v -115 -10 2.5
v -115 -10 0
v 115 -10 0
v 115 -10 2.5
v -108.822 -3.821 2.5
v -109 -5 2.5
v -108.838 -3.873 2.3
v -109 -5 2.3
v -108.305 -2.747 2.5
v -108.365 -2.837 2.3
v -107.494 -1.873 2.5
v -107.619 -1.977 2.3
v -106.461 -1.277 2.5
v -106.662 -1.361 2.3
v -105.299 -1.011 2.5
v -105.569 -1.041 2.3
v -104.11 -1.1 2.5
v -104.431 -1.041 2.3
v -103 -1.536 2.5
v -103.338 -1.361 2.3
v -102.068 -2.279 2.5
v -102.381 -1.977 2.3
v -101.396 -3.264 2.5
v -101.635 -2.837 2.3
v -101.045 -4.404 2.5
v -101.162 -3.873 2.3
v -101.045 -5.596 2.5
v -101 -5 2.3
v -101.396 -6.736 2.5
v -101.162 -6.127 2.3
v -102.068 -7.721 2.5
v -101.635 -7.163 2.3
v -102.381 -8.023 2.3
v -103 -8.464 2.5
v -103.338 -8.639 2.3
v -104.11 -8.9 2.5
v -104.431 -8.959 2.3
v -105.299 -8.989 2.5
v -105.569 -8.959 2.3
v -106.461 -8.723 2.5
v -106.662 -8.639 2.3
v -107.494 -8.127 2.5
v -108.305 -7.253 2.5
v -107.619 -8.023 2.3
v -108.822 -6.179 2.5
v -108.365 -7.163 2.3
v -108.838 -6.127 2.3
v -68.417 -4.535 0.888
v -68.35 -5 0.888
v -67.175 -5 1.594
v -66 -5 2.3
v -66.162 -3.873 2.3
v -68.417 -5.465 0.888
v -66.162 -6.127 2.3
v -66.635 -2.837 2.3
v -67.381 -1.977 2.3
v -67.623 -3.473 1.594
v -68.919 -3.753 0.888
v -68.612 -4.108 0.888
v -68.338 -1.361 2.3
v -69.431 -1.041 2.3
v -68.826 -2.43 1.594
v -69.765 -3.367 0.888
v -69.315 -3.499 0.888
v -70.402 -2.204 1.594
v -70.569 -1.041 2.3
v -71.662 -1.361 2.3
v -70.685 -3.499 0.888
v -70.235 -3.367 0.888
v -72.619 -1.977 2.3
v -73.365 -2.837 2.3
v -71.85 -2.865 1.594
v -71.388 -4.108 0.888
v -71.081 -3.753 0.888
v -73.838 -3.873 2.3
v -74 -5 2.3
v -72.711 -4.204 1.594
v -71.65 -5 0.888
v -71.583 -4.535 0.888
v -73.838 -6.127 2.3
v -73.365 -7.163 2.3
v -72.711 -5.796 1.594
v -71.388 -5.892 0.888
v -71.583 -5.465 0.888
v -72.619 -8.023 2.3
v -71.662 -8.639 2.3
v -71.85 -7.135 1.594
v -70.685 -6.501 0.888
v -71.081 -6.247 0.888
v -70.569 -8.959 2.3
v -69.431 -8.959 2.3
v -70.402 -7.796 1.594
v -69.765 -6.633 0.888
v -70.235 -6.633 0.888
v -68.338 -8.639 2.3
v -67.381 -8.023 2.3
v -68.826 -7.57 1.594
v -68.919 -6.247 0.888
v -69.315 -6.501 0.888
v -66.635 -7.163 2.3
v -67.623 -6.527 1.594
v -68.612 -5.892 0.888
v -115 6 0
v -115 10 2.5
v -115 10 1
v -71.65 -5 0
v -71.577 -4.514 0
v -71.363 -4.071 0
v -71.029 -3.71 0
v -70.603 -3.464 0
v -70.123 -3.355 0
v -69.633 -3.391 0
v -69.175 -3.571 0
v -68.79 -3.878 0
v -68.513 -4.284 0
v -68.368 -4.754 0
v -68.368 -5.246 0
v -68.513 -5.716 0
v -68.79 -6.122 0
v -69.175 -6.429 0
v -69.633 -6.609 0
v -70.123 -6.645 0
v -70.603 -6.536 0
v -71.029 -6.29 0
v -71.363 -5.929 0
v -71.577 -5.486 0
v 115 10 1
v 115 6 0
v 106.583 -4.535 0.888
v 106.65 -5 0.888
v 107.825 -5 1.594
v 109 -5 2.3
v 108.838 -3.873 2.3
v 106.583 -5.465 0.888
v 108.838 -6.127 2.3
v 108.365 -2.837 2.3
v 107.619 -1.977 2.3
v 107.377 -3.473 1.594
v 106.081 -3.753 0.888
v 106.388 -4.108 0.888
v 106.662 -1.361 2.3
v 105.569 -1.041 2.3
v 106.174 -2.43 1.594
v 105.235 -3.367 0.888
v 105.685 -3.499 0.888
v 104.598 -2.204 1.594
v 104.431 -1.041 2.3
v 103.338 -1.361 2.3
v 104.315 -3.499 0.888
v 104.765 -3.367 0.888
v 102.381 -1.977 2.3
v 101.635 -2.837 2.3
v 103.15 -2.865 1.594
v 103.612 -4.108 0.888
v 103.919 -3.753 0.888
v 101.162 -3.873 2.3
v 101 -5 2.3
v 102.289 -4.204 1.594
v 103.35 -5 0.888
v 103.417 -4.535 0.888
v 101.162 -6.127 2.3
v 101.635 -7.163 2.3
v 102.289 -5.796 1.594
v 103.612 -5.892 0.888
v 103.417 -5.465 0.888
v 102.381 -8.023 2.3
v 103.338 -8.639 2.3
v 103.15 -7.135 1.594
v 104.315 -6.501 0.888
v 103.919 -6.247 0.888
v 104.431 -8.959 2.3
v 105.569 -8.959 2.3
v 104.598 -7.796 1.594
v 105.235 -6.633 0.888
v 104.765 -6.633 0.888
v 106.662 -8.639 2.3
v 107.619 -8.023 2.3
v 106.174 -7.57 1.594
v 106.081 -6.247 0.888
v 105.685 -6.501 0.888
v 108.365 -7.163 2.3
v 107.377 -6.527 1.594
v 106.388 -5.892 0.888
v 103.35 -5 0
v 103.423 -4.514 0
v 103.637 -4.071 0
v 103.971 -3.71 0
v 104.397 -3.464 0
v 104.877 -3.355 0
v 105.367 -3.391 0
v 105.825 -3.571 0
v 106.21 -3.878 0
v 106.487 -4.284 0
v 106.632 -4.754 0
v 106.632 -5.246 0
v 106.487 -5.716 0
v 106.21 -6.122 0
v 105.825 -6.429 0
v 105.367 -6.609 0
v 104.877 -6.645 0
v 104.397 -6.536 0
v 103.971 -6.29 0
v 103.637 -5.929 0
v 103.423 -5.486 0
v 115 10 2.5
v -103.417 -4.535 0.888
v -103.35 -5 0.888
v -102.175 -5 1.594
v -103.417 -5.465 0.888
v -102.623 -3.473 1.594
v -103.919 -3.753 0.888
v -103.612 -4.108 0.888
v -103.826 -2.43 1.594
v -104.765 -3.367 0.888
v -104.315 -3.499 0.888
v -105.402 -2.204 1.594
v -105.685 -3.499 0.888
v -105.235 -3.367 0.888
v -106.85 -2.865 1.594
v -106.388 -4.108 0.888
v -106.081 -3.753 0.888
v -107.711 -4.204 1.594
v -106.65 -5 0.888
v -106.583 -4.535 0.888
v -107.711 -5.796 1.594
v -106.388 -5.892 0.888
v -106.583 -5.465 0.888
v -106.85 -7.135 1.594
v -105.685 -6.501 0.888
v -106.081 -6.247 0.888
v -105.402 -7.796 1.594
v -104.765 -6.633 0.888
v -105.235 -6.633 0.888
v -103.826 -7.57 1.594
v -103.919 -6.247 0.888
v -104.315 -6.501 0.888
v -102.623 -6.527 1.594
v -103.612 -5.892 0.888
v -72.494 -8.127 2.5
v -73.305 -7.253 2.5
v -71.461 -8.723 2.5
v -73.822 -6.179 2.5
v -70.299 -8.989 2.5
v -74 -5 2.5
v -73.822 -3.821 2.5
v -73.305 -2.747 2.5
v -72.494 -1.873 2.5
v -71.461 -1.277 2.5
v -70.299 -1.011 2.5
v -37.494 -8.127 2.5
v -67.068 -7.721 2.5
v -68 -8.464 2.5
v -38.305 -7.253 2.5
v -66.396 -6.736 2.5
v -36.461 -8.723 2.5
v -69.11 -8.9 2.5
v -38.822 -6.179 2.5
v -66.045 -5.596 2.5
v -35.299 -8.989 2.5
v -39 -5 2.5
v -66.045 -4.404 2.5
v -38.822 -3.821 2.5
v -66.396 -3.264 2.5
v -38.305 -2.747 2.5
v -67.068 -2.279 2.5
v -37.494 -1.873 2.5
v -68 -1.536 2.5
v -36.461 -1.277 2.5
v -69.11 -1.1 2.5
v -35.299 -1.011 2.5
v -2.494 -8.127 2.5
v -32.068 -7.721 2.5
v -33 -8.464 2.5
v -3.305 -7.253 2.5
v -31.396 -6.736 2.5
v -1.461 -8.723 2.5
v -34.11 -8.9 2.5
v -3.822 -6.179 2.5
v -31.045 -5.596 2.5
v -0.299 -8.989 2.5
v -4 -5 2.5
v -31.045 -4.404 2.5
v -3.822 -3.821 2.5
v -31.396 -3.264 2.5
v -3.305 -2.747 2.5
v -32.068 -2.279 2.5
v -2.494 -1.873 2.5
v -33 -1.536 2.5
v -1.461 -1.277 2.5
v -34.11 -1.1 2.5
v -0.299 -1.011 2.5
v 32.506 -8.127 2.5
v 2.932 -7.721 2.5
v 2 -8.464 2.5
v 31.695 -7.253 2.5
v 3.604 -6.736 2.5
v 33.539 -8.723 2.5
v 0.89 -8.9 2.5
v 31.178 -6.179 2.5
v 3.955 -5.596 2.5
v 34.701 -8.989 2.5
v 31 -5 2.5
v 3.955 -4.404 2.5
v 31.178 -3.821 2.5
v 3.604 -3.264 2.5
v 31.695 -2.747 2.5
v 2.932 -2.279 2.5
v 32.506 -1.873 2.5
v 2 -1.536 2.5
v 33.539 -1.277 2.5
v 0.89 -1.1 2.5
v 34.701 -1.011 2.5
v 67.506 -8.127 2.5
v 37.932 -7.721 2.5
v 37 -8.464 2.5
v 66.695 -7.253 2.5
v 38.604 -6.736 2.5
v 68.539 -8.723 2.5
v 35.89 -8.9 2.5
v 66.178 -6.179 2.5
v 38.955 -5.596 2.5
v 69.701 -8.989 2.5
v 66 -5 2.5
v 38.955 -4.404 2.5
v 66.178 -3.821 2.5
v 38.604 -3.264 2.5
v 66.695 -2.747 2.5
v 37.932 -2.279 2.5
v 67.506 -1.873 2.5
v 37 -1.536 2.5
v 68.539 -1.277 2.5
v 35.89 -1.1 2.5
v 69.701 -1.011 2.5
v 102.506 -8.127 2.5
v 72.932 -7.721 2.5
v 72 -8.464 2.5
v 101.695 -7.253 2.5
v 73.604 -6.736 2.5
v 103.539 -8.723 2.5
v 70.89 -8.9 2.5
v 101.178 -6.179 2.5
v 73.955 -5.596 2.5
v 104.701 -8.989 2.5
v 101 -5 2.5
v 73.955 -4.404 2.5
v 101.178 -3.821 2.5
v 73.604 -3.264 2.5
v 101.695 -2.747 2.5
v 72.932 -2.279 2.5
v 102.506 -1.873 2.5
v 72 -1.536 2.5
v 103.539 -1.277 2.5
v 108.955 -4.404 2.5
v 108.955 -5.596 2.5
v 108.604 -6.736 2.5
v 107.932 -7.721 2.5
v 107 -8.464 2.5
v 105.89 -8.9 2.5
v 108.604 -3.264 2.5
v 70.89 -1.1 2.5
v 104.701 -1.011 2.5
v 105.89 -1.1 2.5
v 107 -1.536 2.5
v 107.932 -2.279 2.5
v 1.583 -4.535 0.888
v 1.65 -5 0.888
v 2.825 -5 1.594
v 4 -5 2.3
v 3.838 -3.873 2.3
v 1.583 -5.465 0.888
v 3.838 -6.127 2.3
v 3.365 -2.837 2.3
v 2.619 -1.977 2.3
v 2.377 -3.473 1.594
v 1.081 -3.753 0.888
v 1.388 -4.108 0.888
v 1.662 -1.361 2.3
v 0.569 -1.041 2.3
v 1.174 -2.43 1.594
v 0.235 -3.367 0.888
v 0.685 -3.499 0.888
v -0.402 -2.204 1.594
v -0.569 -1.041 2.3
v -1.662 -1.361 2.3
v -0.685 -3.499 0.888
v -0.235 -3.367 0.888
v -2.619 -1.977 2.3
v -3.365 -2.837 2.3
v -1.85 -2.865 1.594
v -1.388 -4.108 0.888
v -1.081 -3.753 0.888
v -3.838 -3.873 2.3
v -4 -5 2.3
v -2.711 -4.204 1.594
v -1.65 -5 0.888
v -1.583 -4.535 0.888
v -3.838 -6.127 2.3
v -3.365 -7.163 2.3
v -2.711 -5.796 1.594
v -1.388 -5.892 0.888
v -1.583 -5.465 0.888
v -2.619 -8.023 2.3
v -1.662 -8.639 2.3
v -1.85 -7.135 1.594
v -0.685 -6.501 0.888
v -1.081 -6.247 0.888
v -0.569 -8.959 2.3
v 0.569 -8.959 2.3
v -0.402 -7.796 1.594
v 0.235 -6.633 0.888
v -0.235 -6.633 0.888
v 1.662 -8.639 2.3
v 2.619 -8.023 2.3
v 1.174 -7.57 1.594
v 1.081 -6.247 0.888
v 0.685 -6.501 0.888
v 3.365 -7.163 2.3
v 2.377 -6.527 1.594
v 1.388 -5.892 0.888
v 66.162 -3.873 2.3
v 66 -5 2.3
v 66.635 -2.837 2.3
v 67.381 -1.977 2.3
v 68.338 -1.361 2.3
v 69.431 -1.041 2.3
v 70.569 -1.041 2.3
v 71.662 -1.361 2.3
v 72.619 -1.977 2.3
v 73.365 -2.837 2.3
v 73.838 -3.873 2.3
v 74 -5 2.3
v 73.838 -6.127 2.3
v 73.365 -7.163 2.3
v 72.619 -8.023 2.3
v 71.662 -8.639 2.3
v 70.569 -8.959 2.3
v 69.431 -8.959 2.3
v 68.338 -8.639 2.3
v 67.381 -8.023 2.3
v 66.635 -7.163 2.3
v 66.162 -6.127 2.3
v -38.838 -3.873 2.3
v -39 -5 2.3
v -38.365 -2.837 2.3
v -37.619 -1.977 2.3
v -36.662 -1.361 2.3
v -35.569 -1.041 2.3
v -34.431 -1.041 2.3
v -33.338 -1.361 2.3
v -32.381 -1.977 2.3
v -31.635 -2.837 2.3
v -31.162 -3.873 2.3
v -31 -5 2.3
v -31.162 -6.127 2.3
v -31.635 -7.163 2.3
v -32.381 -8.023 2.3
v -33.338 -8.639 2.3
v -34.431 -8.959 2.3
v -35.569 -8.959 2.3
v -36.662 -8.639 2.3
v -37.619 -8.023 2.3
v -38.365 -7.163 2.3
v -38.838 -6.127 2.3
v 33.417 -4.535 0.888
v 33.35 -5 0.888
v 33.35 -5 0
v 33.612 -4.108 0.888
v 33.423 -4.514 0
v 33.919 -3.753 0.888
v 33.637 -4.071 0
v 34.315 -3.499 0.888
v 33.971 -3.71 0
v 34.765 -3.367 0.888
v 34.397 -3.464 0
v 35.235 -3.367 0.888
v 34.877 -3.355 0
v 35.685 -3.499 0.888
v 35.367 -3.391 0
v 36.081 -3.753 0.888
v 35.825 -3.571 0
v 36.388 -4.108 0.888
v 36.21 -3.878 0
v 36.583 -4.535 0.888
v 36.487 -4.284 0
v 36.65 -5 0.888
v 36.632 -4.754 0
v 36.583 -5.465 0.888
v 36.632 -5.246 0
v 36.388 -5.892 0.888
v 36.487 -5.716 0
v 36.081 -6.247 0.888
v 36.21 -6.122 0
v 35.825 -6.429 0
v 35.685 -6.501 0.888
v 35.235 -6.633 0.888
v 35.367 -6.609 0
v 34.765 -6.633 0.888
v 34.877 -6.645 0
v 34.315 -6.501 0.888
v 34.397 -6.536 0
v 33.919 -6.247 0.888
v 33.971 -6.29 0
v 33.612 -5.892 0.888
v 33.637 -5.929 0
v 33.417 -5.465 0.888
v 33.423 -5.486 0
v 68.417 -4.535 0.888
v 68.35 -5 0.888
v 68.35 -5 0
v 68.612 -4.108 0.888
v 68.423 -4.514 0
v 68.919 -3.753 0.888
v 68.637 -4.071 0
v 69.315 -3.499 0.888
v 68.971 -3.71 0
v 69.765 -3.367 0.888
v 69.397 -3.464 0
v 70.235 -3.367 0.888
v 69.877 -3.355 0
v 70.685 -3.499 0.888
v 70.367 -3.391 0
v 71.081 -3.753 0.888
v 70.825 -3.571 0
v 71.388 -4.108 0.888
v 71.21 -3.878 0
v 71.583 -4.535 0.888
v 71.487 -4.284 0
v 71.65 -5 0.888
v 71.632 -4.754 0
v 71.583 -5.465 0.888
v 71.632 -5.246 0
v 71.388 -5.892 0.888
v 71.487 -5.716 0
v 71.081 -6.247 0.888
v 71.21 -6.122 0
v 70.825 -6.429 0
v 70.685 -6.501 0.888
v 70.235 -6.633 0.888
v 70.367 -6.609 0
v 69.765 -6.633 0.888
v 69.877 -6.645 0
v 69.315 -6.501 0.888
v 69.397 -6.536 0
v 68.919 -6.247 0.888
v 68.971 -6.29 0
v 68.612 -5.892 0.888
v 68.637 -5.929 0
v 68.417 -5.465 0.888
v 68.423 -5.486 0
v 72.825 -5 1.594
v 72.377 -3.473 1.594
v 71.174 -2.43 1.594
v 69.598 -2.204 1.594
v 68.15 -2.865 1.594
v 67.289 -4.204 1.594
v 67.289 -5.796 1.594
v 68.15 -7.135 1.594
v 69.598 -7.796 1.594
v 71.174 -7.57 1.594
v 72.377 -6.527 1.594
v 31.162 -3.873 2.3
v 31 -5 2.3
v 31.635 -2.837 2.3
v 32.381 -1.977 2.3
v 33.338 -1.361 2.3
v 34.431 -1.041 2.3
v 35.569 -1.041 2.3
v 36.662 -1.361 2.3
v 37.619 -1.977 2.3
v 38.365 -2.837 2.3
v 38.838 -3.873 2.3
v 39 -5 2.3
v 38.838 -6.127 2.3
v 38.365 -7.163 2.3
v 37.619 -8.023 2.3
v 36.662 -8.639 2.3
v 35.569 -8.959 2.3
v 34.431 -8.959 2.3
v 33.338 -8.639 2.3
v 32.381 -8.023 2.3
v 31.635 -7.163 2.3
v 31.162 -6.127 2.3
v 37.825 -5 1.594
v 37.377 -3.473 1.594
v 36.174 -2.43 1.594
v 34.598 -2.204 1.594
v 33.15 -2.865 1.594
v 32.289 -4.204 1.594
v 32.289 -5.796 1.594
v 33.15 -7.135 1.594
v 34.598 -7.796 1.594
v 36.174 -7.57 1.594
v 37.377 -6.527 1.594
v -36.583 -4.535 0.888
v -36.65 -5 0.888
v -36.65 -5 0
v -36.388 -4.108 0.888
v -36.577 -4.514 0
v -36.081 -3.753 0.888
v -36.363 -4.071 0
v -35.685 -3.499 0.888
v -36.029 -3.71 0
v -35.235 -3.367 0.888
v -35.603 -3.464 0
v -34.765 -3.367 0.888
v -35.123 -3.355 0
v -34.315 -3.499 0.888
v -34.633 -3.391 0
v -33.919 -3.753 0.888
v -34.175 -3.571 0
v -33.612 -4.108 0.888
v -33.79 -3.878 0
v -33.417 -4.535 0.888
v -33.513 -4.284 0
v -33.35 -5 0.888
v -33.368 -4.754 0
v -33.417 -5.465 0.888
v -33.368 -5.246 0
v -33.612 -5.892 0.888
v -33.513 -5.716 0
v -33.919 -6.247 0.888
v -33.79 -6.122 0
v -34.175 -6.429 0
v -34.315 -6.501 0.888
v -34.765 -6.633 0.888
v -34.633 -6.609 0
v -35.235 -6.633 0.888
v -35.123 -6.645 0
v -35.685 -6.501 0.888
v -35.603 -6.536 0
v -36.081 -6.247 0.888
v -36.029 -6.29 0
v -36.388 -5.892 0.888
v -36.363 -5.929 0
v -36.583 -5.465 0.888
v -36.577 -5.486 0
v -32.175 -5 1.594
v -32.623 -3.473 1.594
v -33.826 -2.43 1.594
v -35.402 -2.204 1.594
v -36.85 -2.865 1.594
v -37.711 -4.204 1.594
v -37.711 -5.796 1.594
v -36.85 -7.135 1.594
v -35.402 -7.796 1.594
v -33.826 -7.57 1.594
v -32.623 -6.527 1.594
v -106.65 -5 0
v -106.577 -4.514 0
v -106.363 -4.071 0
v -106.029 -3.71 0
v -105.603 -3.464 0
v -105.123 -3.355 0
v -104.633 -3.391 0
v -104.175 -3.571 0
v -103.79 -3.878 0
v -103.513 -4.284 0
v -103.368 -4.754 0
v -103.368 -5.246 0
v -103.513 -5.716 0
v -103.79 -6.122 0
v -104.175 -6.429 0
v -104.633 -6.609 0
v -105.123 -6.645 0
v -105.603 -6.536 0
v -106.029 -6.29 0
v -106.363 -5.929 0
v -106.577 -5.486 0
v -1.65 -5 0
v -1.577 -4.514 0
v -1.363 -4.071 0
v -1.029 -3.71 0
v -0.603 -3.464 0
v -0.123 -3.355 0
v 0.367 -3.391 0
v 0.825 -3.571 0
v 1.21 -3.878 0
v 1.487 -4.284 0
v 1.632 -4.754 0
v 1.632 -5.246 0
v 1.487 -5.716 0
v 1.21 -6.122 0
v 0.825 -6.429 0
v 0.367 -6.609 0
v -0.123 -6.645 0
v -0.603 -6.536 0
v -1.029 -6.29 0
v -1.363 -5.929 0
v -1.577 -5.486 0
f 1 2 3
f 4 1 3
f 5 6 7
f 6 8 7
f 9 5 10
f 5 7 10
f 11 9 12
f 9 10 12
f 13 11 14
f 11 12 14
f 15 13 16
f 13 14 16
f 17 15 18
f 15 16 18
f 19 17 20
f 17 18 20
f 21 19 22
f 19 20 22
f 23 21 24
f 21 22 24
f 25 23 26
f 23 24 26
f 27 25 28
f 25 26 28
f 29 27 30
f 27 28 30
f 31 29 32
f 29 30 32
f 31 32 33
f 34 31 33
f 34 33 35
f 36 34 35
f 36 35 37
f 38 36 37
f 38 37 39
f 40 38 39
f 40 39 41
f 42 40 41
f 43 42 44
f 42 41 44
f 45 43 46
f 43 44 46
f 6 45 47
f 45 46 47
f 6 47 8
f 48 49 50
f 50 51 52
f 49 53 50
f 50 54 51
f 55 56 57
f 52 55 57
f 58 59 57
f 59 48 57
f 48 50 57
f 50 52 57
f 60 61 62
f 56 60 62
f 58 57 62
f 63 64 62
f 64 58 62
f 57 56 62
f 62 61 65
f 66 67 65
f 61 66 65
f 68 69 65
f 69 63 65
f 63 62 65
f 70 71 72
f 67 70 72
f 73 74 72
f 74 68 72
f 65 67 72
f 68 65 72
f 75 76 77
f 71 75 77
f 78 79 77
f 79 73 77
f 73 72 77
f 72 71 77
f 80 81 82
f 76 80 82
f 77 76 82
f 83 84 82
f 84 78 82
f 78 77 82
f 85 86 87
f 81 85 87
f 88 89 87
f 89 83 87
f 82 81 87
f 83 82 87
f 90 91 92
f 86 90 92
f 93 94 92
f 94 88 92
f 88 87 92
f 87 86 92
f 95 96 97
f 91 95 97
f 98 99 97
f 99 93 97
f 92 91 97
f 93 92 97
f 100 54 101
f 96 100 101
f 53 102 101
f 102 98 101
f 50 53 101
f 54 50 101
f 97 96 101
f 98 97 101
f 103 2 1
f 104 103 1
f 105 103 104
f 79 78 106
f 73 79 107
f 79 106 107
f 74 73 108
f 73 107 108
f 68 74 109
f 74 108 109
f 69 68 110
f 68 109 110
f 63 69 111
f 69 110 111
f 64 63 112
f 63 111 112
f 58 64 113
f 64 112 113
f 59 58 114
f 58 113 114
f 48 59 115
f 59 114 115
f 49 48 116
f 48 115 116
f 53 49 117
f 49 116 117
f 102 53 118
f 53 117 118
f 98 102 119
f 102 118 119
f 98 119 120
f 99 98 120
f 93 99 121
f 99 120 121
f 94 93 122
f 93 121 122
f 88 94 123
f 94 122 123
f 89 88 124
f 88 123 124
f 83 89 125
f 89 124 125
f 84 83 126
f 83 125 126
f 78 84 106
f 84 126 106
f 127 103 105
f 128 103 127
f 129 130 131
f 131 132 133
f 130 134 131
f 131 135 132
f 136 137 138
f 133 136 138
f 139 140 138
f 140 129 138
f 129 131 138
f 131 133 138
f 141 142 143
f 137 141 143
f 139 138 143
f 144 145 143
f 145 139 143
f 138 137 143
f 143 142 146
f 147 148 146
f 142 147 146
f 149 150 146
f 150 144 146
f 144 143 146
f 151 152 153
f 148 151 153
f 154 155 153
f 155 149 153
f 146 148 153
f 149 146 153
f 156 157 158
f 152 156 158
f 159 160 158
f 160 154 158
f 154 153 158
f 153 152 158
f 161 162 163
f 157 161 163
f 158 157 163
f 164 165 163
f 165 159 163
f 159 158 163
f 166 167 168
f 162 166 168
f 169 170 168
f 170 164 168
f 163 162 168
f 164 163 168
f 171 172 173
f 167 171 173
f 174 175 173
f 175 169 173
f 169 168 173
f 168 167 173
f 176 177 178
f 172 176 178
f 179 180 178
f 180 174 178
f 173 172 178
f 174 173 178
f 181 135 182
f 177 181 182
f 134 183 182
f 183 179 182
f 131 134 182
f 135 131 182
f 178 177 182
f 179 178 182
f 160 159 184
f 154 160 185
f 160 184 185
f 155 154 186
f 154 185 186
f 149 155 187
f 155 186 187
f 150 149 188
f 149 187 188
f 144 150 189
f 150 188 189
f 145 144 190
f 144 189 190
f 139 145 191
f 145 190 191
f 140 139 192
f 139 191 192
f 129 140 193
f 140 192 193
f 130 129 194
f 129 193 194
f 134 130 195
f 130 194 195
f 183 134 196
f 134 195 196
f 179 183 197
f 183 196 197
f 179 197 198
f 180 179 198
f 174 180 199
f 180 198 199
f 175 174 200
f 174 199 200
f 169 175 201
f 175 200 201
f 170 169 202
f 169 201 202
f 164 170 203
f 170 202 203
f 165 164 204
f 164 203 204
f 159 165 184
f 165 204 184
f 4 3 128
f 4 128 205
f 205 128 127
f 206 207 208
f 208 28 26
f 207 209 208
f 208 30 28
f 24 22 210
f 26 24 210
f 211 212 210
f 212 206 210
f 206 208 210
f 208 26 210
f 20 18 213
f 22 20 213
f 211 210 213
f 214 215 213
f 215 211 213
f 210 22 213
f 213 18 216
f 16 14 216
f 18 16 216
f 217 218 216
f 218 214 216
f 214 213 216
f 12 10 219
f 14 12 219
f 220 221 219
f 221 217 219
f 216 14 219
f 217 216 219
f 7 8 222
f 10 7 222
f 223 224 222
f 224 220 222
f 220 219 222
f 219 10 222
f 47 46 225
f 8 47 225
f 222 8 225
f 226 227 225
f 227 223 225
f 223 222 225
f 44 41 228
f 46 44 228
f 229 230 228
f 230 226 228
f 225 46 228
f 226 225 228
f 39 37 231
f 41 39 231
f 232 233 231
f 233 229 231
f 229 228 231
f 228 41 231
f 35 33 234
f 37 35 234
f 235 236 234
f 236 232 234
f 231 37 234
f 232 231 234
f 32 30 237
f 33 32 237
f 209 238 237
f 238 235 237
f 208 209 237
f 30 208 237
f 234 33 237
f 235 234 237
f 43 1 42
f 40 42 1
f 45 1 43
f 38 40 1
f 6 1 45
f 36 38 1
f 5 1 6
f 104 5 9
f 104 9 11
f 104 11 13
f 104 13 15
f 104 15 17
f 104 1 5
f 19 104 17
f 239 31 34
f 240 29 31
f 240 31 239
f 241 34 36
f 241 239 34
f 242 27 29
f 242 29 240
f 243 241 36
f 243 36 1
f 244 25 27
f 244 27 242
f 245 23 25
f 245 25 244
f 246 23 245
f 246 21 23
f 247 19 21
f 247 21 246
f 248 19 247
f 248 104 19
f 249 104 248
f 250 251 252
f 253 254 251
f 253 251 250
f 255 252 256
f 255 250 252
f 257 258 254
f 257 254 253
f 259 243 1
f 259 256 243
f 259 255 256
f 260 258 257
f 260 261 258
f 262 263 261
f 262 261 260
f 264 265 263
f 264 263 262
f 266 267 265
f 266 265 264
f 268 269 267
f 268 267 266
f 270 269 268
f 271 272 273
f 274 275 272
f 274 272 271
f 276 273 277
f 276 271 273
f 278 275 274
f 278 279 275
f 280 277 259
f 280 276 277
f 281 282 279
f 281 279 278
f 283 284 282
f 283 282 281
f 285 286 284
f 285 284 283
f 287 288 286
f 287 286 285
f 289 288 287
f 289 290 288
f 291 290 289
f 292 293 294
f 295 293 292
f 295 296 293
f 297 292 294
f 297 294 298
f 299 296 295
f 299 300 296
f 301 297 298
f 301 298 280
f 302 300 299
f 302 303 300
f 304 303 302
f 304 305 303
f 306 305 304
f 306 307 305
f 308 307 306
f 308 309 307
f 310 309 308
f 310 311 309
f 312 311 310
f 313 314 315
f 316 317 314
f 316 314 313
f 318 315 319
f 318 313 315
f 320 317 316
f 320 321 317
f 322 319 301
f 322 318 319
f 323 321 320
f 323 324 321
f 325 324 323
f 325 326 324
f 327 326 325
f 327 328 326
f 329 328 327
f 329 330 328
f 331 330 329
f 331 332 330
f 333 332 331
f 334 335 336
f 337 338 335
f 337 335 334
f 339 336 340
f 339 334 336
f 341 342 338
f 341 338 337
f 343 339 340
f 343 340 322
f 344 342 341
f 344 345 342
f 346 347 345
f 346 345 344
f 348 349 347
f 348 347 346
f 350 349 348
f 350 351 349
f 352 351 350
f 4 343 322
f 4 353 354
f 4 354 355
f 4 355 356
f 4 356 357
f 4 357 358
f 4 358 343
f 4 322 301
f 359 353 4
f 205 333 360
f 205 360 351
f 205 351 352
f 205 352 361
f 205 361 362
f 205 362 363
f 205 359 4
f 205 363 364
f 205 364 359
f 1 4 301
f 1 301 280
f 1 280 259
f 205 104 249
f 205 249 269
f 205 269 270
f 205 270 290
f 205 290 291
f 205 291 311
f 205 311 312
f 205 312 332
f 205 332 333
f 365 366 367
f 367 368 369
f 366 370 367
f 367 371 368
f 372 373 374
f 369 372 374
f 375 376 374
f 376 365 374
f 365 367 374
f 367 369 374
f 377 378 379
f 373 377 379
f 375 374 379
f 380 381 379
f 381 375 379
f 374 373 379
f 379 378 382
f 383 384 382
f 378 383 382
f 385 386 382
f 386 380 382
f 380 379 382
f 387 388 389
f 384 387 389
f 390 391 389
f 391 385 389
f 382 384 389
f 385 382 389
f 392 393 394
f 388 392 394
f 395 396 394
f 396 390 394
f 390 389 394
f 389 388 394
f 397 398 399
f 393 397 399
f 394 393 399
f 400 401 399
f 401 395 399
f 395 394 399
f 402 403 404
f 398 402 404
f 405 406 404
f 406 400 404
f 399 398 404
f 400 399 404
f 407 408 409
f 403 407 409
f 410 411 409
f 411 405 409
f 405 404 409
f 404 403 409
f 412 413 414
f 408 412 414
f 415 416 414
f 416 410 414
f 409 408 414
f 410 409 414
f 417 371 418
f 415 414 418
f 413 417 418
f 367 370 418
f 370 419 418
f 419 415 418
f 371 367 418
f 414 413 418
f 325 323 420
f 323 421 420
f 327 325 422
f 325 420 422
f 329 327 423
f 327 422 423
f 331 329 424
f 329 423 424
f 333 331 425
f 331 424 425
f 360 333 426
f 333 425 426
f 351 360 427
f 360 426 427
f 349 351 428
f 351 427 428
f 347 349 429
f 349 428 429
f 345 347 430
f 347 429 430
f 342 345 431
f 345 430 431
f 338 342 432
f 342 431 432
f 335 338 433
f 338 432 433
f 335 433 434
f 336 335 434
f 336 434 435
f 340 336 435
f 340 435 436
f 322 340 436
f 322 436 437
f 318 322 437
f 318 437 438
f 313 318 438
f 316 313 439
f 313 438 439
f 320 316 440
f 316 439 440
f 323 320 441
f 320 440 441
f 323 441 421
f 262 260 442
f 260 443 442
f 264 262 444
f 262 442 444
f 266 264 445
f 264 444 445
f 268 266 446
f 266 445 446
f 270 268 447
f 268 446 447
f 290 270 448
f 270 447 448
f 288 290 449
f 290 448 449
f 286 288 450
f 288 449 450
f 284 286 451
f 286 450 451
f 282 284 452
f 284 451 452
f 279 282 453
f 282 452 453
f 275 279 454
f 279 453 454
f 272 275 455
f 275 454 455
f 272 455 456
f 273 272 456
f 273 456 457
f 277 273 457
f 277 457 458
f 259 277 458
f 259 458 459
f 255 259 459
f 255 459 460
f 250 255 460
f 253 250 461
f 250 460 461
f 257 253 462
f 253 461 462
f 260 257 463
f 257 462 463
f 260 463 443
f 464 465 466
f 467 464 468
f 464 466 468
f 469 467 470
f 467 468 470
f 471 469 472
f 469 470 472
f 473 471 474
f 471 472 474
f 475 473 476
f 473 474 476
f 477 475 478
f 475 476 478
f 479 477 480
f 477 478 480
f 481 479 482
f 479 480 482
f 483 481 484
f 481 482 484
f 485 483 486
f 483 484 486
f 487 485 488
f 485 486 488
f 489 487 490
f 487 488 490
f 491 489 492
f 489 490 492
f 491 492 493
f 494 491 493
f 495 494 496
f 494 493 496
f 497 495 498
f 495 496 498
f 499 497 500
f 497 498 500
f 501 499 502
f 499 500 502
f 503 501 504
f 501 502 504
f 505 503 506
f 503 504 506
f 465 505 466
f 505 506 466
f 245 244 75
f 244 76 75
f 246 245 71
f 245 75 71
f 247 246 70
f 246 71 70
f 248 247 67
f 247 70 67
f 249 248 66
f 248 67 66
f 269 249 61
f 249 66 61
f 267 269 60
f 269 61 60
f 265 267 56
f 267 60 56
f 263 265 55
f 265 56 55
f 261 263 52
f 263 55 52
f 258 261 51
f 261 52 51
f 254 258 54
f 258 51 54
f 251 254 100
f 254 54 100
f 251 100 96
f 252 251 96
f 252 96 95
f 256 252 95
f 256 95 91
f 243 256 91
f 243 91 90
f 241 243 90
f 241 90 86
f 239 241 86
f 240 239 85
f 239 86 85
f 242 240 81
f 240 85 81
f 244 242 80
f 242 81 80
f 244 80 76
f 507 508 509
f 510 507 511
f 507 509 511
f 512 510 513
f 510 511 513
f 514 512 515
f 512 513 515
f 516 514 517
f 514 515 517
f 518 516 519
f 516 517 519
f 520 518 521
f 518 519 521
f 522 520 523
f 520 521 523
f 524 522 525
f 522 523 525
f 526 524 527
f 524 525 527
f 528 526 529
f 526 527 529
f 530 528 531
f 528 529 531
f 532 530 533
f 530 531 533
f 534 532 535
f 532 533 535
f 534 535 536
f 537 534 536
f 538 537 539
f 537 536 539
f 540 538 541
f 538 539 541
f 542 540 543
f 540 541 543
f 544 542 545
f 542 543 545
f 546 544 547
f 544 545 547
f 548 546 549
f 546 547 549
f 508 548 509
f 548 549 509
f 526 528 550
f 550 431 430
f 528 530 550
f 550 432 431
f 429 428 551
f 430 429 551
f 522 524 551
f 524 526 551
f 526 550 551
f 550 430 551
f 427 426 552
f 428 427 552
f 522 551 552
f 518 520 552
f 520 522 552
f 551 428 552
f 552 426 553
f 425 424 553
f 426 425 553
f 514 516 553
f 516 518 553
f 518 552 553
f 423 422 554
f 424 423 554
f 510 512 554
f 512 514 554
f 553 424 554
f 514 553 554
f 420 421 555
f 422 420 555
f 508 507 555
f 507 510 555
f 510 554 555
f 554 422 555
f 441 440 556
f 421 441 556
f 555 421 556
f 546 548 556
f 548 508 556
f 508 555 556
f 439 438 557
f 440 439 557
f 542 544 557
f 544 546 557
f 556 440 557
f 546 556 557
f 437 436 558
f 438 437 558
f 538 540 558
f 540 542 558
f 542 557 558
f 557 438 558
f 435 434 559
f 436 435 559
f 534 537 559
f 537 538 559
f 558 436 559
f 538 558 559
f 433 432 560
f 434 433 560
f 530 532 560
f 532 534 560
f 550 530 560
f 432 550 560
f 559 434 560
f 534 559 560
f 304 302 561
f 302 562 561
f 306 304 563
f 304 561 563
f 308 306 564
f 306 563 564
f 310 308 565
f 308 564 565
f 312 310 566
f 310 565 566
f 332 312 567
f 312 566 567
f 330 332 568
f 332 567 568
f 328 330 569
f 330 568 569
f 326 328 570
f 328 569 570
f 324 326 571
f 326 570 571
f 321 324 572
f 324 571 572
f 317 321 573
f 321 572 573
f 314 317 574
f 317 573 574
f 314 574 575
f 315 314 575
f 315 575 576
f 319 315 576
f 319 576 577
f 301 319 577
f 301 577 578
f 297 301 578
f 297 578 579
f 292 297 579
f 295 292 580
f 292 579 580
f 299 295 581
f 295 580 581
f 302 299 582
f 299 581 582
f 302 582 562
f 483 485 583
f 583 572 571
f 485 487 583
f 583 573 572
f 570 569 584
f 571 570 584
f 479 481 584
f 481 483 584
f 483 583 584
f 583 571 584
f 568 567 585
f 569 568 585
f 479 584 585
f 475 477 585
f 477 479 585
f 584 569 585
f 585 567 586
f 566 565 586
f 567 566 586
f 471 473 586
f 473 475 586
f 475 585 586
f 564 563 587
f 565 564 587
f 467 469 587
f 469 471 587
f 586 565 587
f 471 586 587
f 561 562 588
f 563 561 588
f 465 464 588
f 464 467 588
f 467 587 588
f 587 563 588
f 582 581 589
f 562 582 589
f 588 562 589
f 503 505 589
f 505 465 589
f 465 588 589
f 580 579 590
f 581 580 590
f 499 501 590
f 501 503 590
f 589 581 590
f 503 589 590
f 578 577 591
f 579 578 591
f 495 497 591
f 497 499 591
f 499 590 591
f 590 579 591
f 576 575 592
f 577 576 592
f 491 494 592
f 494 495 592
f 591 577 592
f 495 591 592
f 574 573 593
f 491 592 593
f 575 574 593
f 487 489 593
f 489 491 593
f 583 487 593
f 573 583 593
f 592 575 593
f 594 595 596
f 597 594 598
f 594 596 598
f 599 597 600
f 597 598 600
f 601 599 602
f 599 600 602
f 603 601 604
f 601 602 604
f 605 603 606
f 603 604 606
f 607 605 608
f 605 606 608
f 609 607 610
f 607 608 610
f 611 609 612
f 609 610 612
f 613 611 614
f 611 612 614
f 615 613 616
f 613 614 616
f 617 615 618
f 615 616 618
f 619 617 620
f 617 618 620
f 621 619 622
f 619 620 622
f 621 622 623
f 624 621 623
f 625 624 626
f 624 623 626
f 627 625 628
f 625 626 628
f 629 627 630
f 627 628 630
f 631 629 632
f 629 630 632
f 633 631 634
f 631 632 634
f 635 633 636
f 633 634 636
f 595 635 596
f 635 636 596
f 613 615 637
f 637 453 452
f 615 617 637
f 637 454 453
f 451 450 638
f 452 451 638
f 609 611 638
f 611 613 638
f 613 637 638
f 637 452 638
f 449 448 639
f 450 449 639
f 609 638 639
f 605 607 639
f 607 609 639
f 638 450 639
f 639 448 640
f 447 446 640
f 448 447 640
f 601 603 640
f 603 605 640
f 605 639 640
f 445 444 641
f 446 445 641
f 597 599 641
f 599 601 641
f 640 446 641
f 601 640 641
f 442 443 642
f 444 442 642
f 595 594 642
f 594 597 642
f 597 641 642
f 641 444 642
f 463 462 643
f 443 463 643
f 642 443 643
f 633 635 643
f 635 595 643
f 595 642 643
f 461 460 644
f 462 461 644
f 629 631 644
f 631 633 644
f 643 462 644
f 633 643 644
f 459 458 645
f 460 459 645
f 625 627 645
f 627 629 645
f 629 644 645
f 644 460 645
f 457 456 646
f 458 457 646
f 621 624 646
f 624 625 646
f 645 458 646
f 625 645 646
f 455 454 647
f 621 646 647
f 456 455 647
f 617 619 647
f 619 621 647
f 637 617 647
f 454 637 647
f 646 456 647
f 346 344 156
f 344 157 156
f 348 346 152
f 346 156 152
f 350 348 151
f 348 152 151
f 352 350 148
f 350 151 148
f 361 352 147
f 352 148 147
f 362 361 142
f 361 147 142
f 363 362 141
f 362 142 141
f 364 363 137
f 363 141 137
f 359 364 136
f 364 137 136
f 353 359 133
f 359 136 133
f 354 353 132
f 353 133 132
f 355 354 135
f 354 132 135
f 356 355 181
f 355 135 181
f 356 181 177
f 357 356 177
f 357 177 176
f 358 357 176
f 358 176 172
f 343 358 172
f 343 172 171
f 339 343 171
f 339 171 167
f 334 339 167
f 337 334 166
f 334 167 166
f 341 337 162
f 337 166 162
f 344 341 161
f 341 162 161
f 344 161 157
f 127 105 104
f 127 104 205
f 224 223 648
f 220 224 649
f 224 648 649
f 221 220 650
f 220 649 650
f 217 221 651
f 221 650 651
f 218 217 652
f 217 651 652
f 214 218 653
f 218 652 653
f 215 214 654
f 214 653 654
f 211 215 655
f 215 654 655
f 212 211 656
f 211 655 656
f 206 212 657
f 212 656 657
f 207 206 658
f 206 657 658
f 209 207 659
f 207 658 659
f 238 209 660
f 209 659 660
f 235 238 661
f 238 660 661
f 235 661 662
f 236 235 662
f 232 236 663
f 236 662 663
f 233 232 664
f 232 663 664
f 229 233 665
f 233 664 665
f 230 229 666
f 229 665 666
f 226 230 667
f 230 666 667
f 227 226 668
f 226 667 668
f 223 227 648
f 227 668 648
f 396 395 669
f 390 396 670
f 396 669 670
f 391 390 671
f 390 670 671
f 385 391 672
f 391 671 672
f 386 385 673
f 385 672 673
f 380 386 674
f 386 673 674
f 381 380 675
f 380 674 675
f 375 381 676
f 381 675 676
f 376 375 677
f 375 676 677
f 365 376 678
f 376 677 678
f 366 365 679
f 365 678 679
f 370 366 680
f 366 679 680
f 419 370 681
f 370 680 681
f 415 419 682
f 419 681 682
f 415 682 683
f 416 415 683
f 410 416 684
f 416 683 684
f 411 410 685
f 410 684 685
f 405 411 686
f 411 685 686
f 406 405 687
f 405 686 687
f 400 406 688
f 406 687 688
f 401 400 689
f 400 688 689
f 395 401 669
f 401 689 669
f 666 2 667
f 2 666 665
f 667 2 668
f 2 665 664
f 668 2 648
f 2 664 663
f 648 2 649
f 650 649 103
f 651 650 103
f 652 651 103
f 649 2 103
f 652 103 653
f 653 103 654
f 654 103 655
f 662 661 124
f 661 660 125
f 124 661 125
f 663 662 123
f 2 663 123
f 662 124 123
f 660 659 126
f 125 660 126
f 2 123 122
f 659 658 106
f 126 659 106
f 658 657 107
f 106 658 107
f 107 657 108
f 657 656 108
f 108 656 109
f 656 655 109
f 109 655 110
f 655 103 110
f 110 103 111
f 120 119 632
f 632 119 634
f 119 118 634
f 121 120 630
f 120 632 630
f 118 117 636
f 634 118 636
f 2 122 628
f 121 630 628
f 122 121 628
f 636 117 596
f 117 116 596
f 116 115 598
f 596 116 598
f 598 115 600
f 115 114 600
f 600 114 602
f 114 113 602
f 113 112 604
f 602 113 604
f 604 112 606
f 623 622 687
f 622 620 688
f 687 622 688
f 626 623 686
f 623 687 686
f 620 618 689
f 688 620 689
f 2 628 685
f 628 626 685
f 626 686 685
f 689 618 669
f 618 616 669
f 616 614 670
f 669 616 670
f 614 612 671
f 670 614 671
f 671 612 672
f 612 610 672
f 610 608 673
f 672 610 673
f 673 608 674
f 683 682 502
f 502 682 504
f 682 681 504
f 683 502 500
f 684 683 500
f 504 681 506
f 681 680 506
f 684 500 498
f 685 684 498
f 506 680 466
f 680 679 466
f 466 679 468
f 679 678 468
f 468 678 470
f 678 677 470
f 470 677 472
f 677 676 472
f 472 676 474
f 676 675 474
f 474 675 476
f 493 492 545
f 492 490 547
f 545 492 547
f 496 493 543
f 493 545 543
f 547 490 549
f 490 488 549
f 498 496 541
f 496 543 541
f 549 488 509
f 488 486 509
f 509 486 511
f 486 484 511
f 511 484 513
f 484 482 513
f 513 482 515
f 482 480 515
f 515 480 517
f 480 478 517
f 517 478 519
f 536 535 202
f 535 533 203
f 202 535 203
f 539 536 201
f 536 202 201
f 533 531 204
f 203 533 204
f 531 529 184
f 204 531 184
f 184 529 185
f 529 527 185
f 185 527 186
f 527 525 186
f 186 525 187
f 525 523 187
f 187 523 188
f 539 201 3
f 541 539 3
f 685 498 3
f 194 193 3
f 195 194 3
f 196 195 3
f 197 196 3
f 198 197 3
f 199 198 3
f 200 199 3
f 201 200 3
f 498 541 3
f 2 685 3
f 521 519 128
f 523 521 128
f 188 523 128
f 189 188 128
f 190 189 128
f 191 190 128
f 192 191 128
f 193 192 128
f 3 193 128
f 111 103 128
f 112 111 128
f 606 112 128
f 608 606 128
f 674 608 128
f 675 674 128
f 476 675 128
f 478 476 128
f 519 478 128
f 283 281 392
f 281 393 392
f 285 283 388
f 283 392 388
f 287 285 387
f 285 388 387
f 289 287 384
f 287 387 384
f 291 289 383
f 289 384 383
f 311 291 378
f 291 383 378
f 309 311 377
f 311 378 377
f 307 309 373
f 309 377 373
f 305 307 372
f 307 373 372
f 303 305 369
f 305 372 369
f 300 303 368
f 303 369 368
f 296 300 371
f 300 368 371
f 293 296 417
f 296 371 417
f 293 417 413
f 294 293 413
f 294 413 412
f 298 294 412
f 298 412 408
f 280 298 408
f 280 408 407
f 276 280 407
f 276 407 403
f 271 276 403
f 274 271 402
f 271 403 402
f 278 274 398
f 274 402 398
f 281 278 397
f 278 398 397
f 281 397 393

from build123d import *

# Parameters (mm, degrees)
F0_W     = 230
F0_H     = 20
F1_DEPTH = 2.5
F3_D     = 3.3
F4_SIZE2 = 4
F4_SIZE  = 1
F6_D     = 8
F6_DEPTH = 0.2
F6_TIP   = 2.4034424761


with BuildPart() as f1:
    # F0 (on Top) → F1 (new body)
    with BuildSketch(Plane.XY):
        Rectangle(F0_W, F0_H)
    extrude(amount=F1_DEPTH)

    # F3 (through all)
    with Locations(Plane.XY.offset(2.5)):
        with Locations((-105, -5), (-70, -5), (-35, -5), (0, -5), (35, -5), (105, -5), (70, -5)):
            Hole(F3_D / 2)

    # F4
    f4_edges = [f1.edges().sort_by_distance(p)[0] for p in [
        (0, 10, 0),
    ]]
    f4_side = f1.faces().sort_by_distance((0, 10, 1.25))[0]
    chamfer(f4_edges, length=F4_SIZE, length2=F4_SIZE2, reference=f4_side)

    # F6
    with Locations(Plane.XY.offset(2.5)):
        with Locations((-105, -5), (-70, -5), (-35, -5), (0, -5), (105, -5), (70, -5), (35, -5)):
            Hole(F6_D / 2, depth=F6_DEPTH)
            with Locations((0, 0, -(F6_DEPTH + F6_TIP / 2))):  # 118° drill point
                Cone(0, F6_D / 2, F6_TIP, mode=Mode.SUBTRACT)


solid = f1.part
